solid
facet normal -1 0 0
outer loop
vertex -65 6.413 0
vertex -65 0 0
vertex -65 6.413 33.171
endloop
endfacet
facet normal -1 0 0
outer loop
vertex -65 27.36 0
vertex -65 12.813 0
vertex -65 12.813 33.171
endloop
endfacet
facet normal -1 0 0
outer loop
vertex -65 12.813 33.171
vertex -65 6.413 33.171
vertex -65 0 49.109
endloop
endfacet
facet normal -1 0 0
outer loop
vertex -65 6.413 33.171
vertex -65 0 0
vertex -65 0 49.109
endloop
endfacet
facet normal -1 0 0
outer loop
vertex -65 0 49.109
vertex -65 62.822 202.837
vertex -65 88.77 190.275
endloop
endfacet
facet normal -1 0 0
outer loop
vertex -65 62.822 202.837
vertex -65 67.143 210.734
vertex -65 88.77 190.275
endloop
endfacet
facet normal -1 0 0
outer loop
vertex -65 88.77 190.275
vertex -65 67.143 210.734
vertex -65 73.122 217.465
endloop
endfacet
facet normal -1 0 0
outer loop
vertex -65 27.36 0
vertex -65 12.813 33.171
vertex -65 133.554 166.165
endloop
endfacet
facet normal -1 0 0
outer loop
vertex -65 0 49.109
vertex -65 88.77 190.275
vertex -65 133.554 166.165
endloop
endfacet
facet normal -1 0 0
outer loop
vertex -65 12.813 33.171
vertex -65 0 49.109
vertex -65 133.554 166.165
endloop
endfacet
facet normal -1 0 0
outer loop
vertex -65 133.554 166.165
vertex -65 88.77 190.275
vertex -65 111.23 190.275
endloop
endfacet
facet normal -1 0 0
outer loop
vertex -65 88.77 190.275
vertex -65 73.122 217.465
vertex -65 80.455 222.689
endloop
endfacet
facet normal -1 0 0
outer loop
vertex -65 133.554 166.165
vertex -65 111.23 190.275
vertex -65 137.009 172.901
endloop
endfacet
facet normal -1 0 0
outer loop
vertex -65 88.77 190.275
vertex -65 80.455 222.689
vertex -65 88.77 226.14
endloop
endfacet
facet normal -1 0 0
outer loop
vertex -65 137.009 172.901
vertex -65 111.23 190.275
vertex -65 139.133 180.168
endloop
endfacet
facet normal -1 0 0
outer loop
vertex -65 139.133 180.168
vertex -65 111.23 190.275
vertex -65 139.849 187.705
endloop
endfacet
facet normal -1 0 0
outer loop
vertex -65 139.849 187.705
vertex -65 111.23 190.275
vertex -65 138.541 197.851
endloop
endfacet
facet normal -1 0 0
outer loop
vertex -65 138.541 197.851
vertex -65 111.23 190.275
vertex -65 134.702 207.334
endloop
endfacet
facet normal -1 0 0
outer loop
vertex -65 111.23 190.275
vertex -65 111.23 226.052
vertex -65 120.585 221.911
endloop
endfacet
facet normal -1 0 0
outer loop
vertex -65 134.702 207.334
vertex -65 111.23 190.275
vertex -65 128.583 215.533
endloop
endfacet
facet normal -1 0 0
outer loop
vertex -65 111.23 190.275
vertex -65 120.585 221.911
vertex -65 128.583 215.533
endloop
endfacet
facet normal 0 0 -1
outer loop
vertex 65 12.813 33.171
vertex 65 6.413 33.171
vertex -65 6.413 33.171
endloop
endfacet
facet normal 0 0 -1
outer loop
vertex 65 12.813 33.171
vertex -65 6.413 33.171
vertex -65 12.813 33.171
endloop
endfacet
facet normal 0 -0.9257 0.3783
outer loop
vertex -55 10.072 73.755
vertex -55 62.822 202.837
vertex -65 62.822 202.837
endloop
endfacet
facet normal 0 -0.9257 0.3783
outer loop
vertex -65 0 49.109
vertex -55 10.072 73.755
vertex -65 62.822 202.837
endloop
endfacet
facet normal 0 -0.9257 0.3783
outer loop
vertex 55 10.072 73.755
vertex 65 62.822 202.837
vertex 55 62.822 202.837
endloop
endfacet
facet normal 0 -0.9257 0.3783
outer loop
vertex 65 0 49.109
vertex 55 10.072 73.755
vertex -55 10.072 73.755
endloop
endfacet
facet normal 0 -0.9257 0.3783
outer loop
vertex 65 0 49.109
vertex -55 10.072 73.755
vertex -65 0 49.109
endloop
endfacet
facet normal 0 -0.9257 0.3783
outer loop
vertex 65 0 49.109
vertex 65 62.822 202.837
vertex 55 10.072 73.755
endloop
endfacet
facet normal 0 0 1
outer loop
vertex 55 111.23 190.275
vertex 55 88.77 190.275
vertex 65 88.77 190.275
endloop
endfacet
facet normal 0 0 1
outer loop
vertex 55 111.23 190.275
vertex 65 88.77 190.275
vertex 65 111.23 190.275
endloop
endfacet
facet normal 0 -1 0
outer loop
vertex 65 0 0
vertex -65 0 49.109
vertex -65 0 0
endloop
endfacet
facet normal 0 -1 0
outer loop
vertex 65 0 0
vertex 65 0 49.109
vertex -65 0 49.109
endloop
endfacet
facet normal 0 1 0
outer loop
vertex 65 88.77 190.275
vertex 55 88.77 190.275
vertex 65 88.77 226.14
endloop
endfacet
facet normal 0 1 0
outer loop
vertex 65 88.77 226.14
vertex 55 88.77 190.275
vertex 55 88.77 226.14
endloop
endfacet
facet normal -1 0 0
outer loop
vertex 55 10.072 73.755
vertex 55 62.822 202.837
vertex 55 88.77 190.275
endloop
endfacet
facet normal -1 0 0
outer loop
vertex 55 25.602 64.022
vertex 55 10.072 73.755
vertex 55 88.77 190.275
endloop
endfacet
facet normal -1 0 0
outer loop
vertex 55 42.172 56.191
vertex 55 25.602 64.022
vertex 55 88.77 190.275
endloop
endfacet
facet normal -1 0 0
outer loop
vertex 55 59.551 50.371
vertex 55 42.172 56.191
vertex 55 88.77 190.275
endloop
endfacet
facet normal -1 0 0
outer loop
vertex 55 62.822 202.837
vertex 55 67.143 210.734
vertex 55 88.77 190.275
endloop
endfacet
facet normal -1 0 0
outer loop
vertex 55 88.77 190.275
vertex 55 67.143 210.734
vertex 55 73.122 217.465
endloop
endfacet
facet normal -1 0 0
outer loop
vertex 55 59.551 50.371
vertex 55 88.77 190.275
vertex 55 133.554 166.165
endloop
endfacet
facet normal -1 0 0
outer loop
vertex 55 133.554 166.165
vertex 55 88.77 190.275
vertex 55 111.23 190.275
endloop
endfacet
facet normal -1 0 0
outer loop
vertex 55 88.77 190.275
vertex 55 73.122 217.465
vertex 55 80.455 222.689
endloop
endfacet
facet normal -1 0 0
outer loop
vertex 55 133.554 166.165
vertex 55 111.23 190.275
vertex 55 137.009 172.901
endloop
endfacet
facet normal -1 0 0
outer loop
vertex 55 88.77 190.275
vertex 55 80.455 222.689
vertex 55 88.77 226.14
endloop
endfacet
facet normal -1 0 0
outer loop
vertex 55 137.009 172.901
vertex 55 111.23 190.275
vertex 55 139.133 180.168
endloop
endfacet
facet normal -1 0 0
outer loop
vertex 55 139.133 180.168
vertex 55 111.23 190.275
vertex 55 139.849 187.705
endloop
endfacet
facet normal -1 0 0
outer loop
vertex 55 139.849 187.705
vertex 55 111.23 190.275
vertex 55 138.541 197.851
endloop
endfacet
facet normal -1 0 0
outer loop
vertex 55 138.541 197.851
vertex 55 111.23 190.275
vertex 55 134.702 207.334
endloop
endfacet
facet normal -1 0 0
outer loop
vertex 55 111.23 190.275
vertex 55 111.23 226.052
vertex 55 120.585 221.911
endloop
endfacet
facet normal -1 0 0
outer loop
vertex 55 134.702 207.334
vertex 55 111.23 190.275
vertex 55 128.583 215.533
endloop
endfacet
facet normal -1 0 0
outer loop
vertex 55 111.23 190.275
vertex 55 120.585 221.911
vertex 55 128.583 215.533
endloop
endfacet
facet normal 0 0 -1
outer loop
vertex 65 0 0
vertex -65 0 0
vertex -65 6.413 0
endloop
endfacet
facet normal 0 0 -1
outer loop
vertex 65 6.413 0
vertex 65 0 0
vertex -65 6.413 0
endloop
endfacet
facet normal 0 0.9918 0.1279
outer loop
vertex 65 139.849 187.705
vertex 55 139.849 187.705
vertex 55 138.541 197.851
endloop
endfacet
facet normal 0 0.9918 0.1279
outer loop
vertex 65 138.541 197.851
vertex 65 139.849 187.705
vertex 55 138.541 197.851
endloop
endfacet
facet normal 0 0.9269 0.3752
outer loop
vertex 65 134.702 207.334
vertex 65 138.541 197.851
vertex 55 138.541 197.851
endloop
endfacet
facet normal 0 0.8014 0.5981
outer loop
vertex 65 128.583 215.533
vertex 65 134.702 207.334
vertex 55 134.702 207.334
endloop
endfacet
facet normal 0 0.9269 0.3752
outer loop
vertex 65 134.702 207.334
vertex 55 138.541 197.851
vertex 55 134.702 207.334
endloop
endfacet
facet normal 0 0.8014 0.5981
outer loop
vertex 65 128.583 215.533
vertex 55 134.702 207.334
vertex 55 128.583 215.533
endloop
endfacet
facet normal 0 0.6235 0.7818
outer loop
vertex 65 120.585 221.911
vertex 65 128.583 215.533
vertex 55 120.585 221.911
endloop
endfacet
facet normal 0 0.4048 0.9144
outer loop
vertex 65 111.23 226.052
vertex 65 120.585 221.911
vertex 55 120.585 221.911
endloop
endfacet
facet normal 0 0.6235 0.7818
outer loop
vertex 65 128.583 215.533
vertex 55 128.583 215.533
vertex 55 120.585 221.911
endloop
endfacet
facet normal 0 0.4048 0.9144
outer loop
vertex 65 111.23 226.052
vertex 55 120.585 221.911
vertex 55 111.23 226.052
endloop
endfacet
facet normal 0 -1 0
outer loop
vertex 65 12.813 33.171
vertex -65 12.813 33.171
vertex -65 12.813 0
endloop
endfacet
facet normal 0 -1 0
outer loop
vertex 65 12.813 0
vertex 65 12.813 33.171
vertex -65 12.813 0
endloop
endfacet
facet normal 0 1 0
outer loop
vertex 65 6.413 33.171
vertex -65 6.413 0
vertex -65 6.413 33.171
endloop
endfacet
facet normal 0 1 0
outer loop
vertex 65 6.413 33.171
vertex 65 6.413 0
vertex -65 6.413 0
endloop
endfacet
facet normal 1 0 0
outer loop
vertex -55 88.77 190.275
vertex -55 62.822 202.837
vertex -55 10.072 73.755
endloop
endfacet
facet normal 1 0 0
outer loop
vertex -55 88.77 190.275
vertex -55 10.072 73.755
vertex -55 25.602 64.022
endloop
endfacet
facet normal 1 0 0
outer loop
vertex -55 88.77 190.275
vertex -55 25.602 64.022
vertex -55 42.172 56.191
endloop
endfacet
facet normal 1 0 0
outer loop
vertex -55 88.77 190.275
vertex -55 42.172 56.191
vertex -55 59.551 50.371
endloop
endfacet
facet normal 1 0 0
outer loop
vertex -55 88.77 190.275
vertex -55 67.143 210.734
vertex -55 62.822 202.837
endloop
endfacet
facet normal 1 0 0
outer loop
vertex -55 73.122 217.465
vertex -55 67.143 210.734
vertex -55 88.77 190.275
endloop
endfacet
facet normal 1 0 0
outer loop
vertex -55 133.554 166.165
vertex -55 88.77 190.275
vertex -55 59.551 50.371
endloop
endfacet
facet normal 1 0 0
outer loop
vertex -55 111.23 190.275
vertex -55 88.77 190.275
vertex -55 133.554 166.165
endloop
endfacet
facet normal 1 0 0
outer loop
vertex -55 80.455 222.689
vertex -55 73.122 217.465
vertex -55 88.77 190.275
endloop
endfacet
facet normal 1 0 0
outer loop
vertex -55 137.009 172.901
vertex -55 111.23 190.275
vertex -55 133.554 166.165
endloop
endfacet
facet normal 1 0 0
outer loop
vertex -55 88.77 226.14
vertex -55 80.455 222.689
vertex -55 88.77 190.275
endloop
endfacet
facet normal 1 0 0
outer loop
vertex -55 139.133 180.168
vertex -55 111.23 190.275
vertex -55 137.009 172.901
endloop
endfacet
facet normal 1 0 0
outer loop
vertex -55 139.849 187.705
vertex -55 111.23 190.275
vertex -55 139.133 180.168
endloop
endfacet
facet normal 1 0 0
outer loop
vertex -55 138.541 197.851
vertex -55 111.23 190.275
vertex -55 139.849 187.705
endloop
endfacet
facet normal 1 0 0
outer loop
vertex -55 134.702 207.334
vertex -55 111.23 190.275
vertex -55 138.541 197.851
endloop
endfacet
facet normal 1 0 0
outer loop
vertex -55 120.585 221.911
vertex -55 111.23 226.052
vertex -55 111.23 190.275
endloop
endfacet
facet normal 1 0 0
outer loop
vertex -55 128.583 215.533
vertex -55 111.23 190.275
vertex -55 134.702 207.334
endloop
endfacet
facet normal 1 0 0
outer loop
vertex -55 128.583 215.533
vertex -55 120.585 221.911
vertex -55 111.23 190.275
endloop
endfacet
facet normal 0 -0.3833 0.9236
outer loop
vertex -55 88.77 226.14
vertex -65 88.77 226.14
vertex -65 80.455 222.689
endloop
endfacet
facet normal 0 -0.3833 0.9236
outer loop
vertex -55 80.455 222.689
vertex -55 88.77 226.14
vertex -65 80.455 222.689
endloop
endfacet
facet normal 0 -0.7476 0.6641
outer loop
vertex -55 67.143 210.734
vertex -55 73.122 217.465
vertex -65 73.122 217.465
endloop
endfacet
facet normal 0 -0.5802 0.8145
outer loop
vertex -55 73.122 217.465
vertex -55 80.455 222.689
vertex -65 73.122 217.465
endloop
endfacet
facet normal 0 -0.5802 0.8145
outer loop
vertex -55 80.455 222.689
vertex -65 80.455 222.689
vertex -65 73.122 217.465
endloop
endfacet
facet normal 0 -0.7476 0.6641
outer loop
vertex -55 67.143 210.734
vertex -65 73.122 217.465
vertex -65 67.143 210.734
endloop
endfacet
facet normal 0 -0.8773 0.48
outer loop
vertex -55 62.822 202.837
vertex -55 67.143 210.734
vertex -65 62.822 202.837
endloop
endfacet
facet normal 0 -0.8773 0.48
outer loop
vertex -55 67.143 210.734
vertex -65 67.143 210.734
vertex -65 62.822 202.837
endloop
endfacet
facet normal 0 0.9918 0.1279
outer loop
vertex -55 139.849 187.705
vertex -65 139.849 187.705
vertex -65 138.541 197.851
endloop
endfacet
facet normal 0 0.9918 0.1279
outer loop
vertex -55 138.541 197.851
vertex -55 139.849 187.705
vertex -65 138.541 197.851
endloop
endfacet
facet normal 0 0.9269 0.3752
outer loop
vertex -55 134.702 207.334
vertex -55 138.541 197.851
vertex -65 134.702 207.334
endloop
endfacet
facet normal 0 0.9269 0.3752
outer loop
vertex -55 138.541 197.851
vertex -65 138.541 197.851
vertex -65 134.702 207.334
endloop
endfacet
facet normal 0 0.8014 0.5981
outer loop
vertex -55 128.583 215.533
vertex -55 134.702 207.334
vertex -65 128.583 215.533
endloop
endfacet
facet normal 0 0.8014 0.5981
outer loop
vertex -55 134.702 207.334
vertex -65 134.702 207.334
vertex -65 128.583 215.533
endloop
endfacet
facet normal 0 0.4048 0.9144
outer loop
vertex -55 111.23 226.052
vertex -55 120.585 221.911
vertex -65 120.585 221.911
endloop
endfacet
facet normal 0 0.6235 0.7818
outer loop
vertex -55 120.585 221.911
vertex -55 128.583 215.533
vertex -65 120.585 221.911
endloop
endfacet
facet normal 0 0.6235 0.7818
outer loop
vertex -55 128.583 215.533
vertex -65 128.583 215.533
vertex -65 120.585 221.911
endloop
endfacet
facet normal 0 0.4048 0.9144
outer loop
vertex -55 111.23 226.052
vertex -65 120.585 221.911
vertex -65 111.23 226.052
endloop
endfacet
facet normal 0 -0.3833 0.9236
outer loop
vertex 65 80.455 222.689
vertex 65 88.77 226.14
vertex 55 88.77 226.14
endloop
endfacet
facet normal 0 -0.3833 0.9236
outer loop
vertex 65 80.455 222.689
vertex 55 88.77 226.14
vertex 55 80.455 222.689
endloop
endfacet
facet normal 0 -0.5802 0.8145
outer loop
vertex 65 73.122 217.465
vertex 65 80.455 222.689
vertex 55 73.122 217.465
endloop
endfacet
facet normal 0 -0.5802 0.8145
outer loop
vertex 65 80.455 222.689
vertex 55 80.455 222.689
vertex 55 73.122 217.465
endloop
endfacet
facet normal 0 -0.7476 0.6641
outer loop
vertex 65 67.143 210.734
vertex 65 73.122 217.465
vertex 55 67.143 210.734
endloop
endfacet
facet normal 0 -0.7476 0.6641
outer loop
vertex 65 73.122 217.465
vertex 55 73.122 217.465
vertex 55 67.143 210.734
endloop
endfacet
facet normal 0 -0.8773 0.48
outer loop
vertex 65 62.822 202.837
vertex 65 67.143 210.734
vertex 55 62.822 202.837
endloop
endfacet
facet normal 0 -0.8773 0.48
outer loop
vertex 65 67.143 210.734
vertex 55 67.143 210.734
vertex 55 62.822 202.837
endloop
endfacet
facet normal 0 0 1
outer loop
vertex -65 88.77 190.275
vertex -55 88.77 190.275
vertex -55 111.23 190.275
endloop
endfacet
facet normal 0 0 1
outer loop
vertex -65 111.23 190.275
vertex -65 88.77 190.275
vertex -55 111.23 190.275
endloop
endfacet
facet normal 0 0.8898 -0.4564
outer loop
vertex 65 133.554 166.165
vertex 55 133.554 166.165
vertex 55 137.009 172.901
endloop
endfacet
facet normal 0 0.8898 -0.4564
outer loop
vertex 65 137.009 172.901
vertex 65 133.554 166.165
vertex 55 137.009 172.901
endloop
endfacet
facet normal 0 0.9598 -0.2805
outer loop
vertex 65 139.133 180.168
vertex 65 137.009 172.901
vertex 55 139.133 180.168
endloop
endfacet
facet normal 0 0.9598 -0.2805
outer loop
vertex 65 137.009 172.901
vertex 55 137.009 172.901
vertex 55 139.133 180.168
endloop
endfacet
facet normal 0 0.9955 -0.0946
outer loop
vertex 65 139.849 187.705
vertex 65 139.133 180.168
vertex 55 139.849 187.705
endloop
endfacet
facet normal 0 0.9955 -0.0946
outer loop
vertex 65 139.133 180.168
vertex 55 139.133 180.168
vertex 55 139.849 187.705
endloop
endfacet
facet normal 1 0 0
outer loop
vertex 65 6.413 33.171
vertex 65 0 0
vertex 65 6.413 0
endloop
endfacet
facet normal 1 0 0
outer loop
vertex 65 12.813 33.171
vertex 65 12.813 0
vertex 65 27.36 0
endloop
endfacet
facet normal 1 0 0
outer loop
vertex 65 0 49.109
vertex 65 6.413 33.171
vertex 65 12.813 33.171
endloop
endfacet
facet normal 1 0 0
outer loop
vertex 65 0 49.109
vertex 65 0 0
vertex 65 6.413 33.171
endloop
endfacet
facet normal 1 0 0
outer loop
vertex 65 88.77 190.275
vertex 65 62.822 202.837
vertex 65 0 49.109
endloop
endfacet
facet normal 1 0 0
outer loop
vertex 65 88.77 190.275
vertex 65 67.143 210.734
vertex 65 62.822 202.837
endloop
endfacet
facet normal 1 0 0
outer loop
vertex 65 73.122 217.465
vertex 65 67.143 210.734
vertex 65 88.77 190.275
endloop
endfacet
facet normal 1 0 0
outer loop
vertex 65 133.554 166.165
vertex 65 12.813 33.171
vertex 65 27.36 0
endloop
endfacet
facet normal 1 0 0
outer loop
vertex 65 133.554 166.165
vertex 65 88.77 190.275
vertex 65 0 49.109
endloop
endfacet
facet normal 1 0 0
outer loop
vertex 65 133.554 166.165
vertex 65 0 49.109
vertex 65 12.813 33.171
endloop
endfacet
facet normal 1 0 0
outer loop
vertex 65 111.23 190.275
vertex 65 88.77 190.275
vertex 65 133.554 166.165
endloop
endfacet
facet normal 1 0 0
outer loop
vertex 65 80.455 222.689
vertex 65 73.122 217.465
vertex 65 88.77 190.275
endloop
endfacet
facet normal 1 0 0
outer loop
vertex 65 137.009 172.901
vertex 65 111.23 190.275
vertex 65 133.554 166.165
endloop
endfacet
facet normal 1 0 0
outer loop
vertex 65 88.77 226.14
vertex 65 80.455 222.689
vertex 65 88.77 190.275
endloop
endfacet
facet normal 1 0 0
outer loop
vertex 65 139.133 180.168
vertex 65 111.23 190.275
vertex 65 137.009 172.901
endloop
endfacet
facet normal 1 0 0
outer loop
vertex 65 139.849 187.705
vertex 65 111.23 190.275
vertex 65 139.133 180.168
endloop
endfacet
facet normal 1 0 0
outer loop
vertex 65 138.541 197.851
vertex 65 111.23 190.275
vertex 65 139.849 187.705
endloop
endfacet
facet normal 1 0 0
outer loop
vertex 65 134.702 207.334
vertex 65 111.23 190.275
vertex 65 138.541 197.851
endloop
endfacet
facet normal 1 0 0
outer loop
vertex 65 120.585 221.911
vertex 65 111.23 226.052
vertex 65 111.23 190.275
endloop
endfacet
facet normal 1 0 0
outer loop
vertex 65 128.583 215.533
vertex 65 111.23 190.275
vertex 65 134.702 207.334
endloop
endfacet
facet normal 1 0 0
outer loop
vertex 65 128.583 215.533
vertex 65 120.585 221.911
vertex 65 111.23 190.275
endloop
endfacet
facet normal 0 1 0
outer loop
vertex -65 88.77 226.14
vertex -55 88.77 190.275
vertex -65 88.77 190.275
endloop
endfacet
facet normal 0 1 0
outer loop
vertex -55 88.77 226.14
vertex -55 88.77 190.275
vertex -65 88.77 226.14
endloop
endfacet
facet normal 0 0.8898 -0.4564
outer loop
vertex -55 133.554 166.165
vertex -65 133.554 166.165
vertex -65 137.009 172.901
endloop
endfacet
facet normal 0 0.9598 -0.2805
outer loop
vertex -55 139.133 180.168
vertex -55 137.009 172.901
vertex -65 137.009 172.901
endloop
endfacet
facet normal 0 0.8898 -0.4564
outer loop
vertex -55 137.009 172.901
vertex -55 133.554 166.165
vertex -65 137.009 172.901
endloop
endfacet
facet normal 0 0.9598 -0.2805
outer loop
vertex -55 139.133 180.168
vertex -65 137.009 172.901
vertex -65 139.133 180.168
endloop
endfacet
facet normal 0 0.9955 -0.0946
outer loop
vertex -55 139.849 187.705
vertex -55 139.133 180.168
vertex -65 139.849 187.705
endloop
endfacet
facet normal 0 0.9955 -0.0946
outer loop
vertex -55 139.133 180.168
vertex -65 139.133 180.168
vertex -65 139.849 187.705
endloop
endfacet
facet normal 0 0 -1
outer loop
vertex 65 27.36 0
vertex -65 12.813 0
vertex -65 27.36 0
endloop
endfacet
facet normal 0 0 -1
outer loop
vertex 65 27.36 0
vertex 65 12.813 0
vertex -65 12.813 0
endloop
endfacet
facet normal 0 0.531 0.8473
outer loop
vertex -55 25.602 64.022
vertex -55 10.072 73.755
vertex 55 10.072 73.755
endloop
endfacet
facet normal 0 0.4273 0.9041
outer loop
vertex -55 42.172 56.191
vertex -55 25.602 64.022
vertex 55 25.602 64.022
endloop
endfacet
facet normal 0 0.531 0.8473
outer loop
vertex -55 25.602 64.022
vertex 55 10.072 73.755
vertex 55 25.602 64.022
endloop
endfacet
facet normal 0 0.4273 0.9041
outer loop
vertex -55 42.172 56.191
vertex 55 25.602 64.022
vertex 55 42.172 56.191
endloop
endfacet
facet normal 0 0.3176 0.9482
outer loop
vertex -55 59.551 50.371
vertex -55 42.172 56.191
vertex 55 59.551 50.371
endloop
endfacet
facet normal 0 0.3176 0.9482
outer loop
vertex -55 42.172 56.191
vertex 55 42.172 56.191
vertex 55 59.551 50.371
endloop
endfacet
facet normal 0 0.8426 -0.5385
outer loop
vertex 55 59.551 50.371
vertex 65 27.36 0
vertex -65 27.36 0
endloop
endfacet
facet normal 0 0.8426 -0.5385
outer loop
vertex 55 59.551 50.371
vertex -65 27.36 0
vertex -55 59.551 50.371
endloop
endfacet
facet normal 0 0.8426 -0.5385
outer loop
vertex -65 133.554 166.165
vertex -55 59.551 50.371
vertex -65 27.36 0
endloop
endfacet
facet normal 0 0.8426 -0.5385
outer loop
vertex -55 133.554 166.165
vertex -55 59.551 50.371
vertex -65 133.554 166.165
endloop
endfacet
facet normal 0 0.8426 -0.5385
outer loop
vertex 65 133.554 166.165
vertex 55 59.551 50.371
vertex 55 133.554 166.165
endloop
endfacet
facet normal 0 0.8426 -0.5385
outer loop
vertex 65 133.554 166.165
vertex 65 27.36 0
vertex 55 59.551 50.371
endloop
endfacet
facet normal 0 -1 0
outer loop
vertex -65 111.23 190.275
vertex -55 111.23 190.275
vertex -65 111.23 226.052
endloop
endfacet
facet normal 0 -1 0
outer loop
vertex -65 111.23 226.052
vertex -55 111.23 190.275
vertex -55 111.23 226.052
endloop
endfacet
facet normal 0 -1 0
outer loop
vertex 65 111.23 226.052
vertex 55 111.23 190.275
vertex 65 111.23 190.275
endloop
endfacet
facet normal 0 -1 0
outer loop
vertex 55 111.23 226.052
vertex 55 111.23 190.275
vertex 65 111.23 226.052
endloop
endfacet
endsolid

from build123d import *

# Parameters (mm, degrees)
F1_DEPTH      = 65
F2_R          = 155
F3_DEPTH      = 55
F4_W          = 22.4599032382
F4_H          = 50
F5_DEPTH      = 65.001
F5_DEPTH_BACK = 65.001


with BuildPart() as f1:
    # F0 (on Right) → F1 (new body, symmetric)
    with BuildSketch(Plane.YZ):
        with BuildLine():
            Line((0, 49.1090789437), (0, 0))
            Line((0, 0), (6.4133200794, 0))
            Line((6.4133200794, 0), (6.4133200794, 33.1709496677))
            Line((6.4133200794, 33.1709496677), (12.8133200794, 33.1709496677))
            Line((12.8133200794, 33.1709496677), (12.8133200794, 0))
            Line((12.8133200794, 0), (27.3600688376, 0))
            Line((27.3600688376, 0), (133.5539043449, 166.1648069956))
            ThreePointArc((133.5539043449, 166.1648069956), (81.4380712008, 152.1940833921), (62.8215606058, 202.8366219893))
            Line((62.8215606058, 202.8366219893), (0, 49.1090789437))
        make_face()
        with BuildLine():
            ThreePointArc((139.8490899801, 187.705129385), (107.5594344934, 226.9549776329), (62.8215606058, 202.8366219893))
            ThreePointArc((62.8215606058, 202.8366219893), (81.4380712008, 152.1940833921), (133.5539043449, 166.1648069956))
            ThreePointArc((133.5539043449, 166.1648069956), (138.2430515795, 176.4844470214), (139.8490899801, 187.705129385))
        make_face()
    extrude(amount=F1_DEPTH, both=True)

    # F2 (on Right) → F3 (cut, symmetric)
    with BuildSketch(Plane.YZ):
        with Locations((100, 200)):
            Circle(F2_R)
    extrude(amount=F3_DEPTH, both=True, mode=Mode.SUBTRACT)

    # F4 (on Right) → F5 (cut, two sides)
    with BuildSketch(Plane.YZ) as f5_sk:
        with Locations((100, 215.2752558307)):
            Rectangle(F4_W, F4_H)
    extrude(amount=-F5_DEPTH, mode=Mode.SUBTRACT)
    extrude(f5_sk.sketch, amount=F5_DEPTH_BACK, mode=Mode.SUBTRACT)


solid = f1.part
